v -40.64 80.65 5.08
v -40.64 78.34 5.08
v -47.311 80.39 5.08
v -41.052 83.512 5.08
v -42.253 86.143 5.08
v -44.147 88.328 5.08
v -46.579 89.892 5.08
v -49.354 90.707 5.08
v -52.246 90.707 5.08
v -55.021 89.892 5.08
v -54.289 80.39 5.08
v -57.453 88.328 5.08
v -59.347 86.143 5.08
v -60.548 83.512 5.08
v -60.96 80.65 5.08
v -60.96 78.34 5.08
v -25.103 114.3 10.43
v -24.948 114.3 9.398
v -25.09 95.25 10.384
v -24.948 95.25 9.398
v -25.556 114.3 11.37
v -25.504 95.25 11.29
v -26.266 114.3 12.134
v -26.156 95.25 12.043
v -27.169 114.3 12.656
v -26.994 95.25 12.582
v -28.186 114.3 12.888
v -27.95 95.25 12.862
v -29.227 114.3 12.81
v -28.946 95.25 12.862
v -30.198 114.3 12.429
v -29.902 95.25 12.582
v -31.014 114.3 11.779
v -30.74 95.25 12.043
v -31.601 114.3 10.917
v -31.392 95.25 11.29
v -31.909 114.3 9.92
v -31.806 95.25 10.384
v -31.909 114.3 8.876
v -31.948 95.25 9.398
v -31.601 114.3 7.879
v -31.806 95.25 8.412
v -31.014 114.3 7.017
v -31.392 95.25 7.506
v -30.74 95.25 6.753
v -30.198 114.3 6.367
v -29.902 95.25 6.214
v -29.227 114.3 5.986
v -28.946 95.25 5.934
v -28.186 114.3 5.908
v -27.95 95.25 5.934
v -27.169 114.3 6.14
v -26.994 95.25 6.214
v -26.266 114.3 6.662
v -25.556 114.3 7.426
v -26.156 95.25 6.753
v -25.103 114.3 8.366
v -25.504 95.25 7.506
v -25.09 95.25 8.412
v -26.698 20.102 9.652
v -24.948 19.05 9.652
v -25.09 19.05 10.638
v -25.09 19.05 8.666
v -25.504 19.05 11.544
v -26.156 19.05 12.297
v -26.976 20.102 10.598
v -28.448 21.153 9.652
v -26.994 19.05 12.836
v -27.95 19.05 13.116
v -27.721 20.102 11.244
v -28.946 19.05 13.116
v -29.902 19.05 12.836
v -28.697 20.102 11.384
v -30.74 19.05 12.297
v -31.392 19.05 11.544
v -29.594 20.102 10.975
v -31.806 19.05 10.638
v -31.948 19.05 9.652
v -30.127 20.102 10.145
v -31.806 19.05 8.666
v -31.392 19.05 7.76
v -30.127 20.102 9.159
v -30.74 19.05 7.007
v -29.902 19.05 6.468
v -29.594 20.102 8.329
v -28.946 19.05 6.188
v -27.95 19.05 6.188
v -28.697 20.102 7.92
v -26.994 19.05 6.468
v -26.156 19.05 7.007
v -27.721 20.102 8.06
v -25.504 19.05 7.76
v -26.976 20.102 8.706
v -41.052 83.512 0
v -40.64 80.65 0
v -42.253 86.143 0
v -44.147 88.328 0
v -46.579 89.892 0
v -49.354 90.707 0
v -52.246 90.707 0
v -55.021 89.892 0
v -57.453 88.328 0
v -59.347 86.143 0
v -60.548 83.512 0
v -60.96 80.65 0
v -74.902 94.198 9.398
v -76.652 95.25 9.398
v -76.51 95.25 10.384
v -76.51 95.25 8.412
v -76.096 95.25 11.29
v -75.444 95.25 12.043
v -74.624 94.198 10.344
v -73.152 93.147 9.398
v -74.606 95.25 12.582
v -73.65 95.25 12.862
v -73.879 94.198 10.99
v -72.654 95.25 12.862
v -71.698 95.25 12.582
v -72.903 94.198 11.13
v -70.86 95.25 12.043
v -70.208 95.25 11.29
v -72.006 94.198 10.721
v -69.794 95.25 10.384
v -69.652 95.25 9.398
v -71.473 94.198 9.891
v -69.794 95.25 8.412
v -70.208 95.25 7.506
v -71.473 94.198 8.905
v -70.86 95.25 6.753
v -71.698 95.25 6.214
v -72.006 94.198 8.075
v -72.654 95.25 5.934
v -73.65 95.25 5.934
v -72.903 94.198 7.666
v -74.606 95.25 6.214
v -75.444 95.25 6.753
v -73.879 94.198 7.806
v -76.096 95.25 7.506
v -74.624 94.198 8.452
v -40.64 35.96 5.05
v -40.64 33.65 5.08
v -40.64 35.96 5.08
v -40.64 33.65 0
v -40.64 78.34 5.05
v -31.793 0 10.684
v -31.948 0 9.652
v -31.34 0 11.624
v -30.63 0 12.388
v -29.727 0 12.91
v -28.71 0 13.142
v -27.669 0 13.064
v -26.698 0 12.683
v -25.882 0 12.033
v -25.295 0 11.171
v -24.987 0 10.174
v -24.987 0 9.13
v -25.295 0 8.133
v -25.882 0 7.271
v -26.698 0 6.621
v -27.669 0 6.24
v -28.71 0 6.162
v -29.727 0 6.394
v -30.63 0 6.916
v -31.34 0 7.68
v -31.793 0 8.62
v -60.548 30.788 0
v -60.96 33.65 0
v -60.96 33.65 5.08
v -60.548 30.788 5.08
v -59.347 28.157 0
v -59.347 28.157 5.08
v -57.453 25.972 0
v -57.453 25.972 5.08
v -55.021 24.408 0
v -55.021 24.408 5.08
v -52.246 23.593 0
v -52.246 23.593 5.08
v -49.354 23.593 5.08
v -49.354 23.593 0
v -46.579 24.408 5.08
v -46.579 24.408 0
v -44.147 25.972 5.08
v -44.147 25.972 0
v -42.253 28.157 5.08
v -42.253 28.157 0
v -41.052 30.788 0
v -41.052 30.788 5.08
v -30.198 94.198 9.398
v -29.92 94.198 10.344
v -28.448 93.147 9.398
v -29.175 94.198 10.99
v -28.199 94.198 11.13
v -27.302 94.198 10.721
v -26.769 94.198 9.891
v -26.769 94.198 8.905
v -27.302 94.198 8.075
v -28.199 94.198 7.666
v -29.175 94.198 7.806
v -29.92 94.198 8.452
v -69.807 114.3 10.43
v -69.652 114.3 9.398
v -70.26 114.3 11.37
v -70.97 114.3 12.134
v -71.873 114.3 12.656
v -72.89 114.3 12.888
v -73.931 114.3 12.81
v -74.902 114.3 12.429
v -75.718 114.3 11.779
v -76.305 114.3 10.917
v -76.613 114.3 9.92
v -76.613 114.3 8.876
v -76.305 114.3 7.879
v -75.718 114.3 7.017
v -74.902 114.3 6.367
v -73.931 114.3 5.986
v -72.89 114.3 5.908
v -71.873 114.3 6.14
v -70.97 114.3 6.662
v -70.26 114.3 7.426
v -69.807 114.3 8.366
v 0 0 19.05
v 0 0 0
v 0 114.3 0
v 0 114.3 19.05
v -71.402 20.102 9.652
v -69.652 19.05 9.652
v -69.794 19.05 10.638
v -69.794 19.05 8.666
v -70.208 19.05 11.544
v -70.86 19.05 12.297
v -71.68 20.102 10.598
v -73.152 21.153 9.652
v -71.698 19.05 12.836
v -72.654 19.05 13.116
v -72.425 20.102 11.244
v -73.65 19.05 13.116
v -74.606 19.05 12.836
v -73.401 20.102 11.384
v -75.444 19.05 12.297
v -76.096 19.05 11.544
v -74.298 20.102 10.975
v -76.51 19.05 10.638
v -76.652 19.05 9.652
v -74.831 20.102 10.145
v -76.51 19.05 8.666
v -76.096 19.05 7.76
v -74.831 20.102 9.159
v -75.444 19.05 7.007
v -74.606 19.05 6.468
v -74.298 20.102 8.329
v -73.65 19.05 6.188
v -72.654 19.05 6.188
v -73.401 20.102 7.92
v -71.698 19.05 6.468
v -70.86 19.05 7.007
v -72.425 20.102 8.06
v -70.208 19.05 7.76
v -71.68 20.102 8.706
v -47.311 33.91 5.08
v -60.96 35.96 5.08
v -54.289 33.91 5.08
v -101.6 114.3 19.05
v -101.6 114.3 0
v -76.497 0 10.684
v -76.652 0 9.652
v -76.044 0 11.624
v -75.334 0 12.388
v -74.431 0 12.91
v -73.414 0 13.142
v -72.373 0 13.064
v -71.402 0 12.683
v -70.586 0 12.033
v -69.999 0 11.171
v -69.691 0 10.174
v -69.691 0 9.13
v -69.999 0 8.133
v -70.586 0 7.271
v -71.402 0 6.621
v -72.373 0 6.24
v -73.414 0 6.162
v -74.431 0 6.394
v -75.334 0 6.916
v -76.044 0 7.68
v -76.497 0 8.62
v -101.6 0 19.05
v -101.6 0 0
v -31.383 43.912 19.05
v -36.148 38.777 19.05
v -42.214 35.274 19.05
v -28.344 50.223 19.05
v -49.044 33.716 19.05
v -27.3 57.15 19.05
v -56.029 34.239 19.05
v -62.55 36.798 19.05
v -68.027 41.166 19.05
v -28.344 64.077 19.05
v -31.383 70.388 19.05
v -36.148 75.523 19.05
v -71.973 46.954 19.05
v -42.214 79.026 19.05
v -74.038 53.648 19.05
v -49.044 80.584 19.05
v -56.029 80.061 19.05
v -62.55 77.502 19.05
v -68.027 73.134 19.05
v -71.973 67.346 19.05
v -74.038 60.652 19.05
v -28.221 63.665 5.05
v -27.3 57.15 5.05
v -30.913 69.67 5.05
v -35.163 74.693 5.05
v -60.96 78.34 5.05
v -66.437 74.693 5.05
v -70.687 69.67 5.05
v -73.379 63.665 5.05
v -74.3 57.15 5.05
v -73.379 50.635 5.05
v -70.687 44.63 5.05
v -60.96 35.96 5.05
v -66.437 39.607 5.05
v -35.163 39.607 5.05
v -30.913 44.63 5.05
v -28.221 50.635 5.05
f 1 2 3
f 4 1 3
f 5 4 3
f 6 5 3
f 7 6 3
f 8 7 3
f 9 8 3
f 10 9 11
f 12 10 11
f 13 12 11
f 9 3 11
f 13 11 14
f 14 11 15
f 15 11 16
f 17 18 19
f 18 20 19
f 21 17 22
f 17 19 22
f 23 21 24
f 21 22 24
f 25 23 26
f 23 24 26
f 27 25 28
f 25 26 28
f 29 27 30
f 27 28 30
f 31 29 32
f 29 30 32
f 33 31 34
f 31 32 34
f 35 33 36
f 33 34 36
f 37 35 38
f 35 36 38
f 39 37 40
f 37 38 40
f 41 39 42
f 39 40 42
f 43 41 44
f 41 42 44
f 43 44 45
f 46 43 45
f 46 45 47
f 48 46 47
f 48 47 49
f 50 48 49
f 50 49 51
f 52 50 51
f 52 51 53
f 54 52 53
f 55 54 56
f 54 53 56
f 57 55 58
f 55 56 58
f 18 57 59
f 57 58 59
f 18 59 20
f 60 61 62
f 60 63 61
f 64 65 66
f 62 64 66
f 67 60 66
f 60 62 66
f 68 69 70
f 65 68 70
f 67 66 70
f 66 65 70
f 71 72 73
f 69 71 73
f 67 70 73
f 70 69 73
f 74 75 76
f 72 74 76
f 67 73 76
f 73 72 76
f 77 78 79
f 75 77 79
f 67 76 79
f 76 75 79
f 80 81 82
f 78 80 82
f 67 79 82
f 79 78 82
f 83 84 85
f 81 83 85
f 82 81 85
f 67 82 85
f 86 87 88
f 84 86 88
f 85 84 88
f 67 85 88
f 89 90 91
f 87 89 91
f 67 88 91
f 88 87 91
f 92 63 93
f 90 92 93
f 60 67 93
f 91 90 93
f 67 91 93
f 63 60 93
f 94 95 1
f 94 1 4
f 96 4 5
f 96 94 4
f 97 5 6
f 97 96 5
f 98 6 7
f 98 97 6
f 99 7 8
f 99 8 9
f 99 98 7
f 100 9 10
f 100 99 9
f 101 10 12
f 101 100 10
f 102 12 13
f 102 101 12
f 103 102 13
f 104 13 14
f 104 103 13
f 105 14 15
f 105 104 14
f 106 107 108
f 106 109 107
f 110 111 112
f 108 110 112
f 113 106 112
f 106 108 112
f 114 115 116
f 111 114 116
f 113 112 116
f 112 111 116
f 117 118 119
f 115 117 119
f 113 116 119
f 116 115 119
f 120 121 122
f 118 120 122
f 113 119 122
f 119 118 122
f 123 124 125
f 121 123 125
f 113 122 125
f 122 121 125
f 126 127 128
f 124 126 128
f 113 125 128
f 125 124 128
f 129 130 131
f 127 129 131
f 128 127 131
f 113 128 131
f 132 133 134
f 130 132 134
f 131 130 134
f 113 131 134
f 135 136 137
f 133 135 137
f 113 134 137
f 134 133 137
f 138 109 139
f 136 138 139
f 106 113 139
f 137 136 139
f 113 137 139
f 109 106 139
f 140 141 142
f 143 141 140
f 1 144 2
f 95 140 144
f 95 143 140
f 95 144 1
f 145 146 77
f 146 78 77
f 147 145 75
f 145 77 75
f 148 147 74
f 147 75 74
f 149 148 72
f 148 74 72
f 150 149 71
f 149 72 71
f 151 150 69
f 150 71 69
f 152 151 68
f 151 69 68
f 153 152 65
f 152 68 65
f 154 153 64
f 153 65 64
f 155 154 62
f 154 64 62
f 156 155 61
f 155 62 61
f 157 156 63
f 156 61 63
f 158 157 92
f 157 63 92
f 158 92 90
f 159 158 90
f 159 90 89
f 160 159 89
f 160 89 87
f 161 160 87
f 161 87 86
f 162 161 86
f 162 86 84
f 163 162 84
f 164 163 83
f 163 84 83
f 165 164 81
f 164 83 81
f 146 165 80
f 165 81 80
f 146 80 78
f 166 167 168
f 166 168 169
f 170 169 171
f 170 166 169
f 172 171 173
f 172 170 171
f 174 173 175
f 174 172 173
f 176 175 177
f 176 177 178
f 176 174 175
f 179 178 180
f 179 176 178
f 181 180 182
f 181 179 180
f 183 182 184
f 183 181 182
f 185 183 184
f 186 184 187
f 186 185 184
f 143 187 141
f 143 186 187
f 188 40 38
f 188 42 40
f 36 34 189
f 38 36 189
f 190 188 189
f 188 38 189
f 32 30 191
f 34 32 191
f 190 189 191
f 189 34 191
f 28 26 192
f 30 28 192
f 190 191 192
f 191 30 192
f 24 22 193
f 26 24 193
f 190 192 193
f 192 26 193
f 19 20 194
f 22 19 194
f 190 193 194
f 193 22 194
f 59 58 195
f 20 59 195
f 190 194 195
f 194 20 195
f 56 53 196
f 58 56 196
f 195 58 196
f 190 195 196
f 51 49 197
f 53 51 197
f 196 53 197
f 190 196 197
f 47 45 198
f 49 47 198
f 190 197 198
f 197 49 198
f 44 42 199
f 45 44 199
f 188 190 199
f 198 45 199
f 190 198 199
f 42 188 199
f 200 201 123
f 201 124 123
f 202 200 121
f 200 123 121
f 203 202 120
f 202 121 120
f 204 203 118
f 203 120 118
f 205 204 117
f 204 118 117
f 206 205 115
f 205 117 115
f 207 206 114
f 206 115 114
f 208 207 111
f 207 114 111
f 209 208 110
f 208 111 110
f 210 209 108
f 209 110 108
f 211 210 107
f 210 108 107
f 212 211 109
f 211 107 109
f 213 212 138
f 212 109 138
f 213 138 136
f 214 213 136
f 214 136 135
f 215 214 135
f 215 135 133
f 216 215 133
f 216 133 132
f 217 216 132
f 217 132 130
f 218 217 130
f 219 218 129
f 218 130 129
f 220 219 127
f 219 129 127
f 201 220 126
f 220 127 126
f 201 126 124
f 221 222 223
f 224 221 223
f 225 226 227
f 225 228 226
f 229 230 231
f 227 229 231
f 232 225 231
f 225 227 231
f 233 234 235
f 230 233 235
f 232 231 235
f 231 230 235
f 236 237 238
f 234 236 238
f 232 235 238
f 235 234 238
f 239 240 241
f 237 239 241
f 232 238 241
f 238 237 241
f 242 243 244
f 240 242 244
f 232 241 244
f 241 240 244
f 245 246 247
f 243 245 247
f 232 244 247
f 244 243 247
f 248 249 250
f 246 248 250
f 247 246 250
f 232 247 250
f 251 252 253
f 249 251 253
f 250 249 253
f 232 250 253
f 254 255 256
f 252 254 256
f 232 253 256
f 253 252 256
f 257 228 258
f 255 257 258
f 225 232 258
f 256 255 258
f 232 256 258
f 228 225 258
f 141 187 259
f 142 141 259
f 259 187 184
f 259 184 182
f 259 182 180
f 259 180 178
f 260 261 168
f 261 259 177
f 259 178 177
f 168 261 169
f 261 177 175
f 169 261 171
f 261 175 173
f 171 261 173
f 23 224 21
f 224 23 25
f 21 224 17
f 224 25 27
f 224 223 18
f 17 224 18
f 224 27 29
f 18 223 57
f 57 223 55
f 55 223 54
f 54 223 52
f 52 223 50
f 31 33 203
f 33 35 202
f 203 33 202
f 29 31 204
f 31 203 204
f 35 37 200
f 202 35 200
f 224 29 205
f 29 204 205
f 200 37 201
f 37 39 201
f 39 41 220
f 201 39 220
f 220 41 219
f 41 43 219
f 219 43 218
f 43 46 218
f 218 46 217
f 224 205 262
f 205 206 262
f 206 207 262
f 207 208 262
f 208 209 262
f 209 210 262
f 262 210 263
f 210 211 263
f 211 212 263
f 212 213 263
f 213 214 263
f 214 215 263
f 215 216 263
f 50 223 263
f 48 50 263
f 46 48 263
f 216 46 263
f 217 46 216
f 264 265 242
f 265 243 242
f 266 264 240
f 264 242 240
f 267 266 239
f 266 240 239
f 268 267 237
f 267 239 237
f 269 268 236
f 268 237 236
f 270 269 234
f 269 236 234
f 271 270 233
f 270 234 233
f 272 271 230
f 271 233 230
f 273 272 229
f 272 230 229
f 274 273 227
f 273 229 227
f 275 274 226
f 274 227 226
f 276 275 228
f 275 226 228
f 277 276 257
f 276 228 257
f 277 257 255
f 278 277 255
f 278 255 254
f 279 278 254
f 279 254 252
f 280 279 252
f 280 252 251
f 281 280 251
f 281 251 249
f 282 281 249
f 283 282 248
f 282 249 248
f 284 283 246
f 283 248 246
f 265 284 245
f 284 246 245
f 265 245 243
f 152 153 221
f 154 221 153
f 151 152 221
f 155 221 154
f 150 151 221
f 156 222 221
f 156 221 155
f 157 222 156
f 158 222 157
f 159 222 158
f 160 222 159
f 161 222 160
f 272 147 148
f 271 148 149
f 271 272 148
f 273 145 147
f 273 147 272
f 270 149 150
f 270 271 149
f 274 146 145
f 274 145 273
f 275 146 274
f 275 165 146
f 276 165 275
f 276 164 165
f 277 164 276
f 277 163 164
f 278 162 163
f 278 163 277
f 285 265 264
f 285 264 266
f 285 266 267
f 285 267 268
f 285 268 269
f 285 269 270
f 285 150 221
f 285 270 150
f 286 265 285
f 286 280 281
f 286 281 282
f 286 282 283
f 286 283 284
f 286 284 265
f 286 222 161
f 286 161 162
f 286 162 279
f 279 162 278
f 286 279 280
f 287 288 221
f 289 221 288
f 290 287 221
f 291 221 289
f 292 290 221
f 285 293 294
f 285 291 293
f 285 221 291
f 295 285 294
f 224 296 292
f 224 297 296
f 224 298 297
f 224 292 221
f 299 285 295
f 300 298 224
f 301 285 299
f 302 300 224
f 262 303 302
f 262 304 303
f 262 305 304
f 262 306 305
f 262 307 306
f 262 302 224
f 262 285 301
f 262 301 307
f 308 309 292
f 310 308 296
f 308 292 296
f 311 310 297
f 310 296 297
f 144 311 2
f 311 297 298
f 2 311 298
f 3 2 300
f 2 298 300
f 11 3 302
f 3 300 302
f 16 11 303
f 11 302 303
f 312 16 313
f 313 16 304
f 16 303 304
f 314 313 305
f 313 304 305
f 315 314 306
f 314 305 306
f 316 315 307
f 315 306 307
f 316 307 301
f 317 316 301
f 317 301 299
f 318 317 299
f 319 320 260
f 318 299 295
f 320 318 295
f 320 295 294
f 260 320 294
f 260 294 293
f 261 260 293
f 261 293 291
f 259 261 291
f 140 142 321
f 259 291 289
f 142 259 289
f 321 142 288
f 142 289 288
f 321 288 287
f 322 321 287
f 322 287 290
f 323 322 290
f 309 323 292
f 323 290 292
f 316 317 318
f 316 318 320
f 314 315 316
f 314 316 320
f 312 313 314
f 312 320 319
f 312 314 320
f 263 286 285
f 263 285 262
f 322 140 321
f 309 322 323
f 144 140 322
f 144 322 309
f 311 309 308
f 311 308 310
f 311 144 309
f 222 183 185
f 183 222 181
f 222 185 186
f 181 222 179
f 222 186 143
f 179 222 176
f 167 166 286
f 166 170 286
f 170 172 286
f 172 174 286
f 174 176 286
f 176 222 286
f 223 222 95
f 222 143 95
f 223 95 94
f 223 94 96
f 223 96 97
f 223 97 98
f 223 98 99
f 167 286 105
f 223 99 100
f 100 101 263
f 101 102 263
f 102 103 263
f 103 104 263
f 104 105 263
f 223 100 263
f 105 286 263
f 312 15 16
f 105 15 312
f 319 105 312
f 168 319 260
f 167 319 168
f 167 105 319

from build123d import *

# Parameters (mm, degrees)
SKETCH2_W                 = 114.3
SKETCH2_H                 = 101.6
BOSS_EXTRUDE2_DEPTH       = 19.05
M8X1_0_TAPPED_HOLE1_D     = 7
M8X1_0_TAPPED_HOLE1_DEPTH = 19.05
M8X1_0_TAPPED_HOLE1_TIP   = 2.103012167
M8X1_0_TAPPED_HOLE2_D     = 7
M8X1_0_TAPPED_HOLE2_DEPTH = 19.05
M8X1_0_TAPPED_HOLE2_TIP   = 2.103012167
SKETCH7_R                 = 23.5000038
CUT_EXTRUDE1_DEPTH        = 13.99999994
CUT_EXTRUDE5_DEPTH        = 5.08


with BuildPart() as part:
    # Sketch2 → Boss-Extrude2 (new body)
    with BuildSketch(Plane(origin=(0, 0, 0), x_dir=(0, 1, 0), z_dir=(0, 0, 1))):
        with Locations((57.15, 50.8)):
            Rectangle(SKETCH2_W, SKETCH2_H)
    extrude(amount=BOSS_EXTRUDE2_DEPTH)

    # M8x1.0 Tapped Hole1
    with Locations(Plane.XZ):
        with Locations((-28.448, 9.652), (-73.152, 9.652)):
            Hole(M8X1_0_TAPPED_HOLE1_D / 2, depth=M8X1_0_TAPPED_HOLE1_DEPTH)
            with Locations((0, 0, -(M8X1_0_TAPPED_HOLE1_DEPTH + M8X1_0_TAPPED_HOLE1_TIP / 2))):  # 118° drill point
                Cone(0, M8X1_0_TAPPED_HOLE1_D / 2, M8X1_0_TAPPED_HOLE1_TIP, mode=Mode.SUBTRACT)

    # M8x1.0 Tapped Hole2
    with Locations(Plane(origin=(0, 114.3, 0), x_dir=(-1, 0, 0), z_dir=(0, 1, 0))):
        with Locations((73.152, 9.398), (28.448, 9.398)):
            Hole(M8X1_0_TAPPED_HOLE2_D / 2, depth=M8X1_0_TAPPED_HOLE2_DEPTH)
            with Locations((0, 0, -(M8X1_0_TAPPED_HOLE2_DEPTH + M8X1_0_TAPPED_HOLE2_TIP / 2))):  # 118° drill point
                Cone(0, M8X1_0_TAPPED_HOLE2_D / 2, M8X1_0_TAPPED_HOLE2_TIP, mode=Mode.SUBTRACT)

    # Sketch7 → Cut-Extrude1 (cut)
    with BuildSketch(Plane.XY.offset(19.05)):
        with Locations((-50.8, 57.15)):
            Circle(SKETCH7_R)
    extrude(amount=-CUT_EXTRUDE1_DEPTH, mode=Mode.SUBTRACT)

    # Sketch8 → Cut-Extrude5 (cut)
    with BuildSketch(Plane(origin=(0, 0, 0), x_dir=(1, 0, 0), z_dir=(0, 0, -1))):
        with BuildLine():
            Line((-40.64, -33.6499962), (-40.64, -80.6500038))
            ThreePointArc((-40.64, -80.6500038), (-50.8, -90.8100038), (-60.96, -80.6500038))
            Line((-60.96, -80.6500038), (-60.96, -33.6499962))
            ThreePointArc((-60.96, -33.6499962), (-50.8, -23.4899962), (-40.64, -33.6499962))
        make_face()
    extrude(amount=-CUT_EXTRUDE5_DEPTH, mode=Mode.SUBTRACT)


solid = part.part
